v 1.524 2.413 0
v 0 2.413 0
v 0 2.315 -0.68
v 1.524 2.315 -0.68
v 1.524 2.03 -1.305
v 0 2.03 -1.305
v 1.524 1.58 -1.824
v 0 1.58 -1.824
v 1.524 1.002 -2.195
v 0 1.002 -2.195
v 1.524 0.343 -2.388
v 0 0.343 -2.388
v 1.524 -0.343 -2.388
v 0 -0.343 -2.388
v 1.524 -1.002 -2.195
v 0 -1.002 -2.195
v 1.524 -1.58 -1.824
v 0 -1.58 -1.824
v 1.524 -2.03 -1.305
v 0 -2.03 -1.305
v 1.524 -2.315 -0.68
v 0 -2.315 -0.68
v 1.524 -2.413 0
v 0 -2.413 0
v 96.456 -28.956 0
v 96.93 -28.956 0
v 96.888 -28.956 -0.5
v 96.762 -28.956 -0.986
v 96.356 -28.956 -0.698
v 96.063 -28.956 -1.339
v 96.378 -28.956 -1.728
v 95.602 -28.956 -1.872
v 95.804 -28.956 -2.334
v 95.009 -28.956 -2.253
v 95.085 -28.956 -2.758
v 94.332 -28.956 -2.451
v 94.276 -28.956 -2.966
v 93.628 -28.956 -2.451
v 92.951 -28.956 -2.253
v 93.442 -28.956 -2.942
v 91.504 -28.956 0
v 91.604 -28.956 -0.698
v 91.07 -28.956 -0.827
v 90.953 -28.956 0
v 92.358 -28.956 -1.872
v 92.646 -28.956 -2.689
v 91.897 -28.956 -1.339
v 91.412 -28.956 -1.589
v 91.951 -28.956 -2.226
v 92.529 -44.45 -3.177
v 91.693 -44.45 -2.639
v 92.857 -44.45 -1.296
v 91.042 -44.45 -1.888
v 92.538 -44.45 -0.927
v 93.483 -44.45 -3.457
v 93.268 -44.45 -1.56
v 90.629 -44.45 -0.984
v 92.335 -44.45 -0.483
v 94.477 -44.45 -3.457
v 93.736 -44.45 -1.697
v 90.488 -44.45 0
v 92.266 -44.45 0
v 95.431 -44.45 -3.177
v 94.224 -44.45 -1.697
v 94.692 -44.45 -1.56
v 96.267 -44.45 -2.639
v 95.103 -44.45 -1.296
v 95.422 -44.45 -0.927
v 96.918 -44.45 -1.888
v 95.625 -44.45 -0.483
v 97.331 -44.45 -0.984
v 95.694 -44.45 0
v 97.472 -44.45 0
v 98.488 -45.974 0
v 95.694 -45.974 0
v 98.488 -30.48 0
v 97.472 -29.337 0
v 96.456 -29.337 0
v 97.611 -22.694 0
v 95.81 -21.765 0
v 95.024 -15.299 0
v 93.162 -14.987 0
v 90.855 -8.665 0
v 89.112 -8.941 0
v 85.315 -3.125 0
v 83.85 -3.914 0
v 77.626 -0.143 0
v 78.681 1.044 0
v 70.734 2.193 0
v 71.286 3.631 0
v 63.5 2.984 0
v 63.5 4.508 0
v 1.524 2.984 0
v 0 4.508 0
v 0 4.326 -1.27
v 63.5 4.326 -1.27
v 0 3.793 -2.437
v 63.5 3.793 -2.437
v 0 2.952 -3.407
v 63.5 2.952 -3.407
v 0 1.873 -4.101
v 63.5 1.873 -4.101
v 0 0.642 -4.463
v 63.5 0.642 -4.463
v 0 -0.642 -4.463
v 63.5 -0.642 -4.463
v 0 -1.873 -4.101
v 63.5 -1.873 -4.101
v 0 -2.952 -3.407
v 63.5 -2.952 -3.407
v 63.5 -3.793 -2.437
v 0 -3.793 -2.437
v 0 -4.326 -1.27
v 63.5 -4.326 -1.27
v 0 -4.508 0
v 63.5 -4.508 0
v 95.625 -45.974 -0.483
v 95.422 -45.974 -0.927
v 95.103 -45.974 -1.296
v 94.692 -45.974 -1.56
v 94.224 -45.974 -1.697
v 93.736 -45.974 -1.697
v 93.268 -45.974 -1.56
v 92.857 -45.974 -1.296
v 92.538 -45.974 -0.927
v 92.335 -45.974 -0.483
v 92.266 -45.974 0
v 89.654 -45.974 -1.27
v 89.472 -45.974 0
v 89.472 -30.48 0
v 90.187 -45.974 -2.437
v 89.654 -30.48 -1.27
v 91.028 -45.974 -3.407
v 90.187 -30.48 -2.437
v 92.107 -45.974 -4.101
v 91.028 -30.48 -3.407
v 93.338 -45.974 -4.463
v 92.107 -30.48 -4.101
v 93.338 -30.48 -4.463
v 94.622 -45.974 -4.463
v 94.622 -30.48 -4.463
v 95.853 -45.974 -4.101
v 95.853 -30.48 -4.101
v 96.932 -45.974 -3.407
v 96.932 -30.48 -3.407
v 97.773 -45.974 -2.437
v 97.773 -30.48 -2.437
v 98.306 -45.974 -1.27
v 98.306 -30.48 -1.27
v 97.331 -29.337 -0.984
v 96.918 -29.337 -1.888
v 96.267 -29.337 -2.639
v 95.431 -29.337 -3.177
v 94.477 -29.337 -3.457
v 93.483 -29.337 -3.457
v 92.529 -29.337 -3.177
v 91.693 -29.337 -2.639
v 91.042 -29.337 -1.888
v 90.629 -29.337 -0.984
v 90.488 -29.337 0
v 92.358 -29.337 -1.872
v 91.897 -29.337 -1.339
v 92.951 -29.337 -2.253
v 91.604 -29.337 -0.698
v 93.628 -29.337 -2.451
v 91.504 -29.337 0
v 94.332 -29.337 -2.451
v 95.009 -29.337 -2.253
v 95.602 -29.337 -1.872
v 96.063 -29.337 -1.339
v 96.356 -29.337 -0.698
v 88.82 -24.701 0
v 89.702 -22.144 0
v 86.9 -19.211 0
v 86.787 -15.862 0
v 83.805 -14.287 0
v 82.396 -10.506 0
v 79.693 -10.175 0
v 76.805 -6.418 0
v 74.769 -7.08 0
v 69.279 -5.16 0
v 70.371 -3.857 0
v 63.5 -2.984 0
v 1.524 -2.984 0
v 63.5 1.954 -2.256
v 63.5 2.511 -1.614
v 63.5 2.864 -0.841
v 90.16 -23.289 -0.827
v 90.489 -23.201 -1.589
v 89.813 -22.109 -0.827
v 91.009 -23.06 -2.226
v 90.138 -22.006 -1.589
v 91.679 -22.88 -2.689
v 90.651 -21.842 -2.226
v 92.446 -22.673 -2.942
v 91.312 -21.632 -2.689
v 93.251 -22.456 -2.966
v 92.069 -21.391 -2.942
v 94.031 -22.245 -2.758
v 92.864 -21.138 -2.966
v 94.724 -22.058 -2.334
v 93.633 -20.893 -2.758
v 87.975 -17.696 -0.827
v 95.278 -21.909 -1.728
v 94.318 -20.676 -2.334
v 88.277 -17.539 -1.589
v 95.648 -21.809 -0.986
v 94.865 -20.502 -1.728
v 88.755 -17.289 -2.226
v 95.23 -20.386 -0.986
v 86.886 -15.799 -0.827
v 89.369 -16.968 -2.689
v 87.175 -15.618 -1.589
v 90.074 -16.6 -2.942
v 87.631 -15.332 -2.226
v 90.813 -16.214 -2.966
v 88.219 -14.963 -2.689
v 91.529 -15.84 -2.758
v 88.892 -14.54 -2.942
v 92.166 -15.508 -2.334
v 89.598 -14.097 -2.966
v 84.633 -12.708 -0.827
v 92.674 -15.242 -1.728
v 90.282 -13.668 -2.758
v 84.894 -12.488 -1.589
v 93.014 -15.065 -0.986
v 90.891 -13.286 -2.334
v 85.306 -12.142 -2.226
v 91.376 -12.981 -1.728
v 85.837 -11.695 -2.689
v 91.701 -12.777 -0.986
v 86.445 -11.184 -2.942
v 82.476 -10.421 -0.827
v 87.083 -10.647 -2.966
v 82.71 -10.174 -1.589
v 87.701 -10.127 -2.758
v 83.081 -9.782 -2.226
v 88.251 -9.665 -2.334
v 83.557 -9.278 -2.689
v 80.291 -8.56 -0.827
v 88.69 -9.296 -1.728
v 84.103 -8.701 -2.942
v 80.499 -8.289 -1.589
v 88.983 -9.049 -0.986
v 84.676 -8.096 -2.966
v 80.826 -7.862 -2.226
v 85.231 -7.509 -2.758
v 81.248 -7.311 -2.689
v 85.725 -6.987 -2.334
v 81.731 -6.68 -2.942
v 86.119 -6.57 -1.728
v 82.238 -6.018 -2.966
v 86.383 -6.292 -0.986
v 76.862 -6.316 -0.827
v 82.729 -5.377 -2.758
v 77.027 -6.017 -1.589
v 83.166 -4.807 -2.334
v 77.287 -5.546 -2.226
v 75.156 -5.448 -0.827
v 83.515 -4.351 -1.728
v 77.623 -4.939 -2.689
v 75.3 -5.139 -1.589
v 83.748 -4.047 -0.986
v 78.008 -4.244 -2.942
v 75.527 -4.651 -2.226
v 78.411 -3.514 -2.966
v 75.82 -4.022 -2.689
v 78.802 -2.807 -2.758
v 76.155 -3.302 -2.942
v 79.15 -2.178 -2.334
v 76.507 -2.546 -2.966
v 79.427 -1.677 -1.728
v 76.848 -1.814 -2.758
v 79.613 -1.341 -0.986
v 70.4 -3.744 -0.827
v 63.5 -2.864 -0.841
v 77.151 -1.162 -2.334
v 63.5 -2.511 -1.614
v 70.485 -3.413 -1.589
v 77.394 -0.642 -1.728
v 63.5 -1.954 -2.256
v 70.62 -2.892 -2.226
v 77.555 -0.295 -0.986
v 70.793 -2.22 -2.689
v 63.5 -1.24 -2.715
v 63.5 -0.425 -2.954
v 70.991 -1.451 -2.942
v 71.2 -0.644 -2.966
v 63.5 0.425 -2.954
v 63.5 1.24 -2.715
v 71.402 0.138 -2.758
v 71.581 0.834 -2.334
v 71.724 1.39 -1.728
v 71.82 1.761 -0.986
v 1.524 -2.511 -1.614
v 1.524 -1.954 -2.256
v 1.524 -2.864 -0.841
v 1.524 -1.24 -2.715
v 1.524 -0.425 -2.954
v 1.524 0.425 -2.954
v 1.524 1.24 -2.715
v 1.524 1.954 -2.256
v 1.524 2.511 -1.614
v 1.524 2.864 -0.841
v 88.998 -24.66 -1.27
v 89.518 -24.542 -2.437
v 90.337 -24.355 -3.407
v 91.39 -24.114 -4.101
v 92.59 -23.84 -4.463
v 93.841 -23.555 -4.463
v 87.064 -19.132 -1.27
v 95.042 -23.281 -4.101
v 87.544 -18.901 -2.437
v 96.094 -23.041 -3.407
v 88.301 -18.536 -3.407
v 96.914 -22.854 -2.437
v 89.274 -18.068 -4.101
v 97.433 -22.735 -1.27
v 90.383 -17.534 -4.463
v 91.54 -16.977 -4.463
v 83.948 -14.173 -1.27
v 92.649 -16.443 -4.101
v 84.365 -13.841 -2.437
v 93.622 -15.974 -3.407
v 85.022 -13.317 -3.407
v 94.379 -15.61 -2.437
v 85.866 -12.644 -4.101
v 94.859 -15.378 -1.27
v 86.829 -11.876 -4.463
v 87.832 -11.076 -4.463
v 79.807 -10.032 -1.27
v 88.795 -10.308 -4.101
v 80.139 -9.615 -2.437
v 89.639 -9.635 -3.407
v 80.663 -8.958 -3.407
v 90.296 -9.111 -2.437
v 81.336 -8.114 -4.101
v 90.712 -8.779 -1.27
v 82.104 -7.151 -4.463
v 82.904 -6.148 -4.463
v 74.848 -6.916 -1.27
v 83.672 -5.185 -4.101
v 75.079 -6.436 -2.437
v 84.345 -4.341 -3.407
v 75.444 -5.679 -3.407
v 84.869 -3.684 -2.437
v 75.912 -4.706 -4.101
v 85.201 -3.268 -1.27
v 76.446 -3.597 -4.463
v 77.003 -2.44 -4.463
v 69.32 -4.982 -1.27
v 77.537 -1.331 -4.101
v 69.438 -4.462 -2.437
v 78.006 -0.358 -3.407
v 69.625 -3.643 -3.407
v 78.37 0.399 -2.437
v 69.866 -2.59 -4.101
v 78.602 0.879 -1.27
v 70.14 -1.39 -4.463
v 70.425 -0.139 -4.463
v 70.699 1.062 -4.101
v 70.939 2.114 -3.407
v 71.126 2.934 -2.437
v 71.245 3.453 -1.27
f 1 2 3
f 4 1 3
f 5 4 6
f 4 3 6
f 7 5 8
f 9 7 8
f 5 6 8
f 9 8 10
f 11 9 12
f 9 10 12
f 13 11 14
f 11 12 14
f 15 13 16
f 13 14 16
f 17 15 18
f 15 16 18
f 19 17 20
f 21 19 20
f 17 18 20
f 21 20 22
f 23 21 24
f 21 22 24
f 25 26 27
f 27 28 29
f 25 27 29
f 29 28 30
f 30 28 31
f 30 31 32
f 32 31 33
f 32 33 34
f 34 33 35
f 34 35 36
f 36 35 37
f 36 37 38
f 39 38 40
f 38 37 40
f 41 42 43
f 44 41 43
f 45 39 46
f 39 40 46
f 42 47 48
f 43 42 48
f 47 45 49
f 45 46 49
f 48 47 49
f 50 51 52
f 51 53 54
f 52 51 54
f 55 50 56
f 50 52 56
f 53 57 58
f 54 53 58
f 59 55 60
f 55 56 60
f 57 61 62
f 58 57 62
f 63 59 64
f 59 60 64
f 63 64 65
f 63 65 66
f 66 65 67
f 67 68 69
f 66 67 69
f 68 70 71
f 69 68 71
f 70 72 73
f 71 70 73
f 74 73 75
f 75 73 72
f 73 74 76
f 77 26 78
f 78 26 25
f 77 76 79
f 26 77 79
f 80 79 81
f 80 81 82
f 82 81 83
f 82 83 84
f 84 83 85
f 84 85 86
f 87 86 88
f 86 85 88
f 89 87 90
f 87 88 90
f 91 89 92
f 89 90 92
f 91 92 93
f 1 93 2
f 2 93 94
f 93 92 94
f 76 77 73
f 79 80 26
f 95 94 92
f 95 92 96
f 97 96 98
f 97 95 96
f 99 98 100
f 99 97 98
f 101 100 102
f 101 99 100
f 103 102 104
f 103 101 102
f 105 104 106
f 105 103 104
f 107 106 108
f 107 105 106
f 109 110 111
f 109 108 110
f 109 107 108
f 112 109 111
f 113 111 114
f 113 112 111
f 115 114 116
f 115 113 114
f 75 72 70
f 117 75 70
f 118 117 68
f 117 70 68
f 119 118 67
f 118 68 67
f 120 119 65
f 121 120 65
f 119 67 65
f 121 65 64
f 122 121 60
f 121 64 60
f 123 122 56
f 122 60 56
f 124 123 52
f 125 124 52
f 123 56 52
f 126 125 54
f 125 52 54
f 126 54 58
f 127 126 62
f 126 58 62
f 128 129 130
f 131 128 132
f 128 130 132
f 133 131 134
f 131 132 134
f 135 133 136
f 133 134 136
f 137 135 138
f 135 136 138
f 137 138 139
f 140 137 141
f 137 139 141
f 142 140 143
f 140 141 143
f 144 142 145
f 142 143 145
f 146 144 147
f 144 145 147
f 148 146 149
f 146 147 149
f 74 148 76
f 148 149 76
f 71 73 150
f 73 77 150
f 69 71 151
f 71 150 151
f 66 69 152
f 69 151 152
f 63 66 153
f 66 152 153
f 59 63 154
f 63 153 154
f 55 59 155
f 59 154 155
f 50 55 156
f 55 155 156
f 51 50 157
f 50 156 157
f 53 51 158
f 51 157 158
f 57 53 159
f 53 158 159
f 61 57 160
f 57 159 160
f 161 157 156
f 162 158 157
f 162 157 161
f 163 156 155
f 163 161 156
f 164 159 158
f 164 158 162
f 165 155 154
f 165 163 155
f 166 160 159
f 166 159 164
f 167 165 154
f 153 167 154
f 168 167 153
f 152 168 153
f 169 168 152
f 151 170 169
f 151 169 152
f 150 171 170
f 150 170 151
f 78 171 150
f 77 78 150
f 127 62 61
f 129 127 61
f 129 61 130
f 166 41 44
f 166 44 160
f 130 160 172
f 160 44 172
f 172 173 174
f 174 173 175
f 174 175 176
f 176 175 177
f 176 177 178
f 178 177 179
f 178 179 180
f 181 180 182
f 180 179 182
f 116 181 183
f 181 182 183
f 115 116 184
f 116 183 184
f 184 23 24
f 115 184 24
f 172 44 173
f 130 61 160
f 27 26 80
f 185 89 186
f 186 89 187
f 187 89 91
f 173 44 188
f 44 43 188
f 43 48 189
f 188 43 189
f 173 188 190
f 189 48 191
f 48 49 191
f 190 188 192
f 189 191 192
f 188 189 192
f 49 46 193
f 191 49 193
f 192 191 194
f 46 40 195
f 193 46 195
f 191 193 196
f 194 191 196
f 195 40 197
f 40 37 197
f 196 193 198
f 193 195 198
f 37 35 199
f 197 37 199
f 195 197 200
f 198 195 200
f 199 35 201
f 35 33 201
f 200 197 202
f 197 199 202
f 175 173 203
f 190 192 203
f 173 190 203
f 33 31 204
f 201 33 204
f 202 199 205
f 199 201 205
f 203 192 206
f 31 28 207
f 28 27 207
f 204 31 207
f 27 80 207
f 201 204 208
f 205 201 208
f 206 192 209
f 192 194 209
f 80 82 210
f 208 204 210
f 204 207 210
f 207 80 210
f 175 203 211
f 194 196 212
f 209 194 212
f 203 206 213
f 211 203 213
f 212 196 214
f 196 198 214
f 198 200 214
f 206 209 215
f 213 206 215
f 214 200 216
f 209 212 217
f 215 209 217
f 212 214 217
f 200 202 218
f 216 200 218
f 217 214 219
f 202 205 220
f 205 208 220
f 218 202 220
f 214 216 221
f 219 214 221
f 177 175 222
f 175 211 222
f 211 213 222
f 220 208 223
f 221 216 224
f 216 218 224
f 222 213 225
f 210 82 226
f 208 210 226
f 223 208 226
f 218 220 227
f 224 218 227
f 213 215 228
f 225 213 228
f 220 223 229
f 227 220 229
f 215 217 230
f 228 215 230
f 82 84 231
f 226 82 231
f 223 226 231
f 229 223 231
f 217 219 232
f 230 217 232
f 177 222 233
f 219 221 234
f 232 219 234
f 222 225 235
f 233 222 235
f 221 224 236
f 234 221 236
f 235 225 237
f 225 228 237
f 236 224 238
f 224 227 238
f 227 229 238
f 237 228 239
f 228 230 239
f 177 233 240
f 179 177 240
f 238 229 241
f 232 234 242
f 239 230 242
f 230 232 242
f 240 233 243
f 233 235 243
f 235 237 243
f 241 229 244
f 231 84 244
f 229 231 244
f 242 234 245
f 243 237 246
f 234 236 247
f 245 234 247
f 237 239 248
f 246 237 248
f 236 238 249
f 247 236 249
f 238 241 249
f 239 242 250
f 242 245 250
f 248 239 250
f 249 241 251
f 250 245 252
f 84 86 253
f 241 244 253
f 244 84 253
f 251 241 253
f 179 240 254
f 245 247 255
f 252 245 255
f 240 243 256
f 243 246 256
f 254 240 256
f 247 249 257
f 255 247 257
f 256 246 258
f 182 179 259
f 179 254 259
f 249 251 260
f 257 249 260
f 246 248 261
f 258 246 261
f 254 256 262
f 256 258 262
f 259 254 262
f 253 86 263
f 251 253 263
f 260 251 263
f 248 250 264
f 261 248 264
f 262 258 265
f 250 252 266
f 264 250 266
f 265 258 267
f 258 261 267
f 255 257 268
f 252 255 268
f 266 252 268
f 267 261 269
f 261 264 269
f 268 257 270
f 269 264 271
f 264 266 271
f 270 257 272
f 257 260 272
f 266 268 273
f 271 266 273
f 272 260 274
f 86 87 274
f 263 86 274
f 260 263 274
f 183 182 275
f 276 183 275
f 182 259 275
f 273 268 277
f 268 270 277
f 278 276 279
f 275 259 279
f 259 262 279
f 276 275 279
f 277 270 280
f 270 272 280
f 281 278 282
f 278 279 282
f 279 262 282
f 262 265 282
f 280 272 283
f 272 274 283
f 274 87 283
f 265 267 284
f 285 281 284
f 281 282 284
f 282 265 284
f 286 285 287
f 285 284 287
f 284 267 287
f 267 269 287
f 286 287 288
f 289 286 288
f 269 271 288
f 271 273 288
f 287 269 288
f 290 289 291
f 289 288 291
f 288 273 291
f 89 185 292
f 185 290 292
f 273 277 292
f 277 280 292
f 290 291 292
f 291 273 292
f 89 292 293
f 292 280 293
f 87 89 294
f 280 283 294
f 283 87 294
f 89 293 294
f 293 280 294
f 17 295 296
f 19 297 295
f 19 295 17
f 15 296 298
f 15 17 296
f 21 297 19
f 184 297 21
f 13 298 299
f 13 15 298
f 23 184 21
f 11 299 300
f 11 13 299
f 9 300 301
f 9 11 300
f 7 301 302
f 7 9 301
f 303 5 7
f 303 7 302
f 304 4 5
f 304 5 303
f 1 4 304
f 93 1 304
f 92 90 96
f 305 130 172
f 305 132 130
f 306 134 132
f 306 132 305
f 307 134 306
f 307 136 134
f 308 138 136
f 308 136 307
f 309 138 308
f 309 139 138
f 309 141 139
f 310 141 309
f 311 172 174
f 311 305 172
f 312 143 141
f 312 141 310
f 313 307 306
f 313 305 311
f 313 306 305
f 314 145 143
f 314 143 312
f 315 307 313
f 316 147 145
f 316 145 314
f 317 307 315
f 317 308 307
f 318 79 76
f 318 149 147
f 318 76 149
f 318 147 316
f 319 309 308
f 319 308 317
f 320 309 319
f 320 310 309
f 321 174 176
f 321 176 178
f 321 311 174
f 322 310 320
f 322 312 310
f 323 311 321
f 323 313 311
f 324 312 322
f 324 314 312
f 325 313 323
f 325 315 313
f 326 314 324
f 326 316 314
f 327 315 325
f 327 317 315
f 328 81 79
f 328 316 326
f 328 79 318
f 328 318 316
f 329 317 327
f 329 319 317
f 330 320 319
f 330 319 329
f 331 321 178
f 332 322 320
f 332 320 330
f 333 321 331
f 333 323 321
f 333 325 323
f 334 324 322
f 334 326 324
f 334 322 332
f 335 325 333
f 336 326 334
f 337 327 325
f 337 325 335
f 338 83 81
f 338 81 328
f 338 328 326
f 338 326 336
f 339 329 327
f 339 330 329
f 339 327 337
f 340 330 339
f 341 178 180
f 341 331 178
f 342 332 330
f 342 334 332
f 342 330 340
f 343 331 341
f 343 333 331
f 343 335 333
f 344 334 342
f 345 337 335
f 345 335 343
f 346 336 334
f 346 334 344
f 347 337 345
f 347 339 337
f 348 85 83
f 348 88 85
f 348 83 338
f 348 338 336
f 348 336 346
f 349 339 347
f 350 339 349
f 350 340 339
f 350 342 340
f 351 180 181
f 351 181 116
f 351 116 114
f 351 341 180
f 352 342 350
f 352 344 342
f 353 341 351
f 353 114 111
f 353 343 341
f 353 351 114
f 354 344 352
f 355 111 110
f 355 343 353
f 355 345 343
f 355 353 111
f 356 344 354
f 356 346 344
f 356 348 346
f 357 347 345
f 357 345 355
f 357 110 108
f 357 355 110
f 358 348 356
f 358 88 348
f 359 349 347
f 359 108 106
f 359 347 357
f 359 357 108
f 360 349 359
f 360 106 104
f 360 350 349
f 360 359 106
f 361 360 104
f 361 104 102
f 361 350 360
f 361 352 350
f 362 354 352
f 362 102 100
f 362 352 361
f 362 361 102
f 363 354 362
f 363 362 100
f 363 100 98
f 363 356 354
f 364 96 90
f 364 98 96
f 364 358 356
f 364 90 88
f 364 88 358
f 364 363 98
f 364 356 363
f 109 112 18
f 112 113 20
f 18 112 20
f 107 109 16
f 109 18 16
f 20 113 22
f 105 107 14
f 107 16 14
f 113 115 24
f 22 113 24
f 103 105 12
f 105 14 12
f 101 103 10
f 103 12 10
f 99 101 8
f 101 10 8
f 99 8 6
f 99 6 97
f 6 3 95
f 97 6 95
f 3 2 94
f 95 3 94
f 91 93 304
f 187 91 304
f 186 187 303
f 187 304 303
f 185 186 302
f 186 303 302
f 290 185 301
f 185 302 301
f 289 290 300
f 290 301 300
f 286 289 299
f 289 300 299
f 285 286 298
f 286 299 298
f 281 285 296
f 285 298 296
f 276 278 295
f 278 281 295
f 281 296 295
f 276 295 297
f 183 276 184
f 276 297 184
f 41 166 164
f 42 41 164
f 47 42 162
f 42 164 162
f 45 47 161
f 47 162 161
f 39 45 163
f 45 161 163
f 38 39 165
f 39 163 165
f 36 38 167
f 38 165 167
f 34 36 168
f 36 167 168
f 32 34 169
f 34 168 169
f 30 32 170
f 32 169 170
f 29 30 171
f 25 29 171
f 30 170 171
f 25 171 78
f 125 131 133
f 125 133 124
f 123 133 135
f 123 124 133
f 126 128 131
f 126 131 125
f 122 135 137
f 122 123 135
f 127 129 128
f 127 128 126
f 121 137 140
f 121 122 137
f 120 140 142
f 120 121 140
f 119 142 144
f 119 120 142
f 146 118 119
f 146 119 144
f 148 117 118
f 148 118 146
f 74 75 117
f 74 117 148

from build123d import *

# Parameters (mm, degrees)
F4_T      = -1.524
F6_DEPTH  = 1.524
F7_DEPTH  = 1.143
F9_DEPTH  = 1.524
F10_DEPTH = 13.97
F12_DEPTH = 1.524


with BuildPart() as f3:
    # F3: sweep along a path in F0
    with BuildLine(Plane.XY) as f3_path:
        ThreePointArc((93.98, -30.48), (85.0526146906, -8.9273853094), (63.5, 0))
        Line((63.5, 0), (0, 0))
    # F2 (on plane+point) → F3 (sweep)
    with BuildSketch(Plane.XZ.offset(30.48)):
        with BuildLine():
            Line((98.4885, 0), (89.4715, 0))
            ThreePointArc((89.4715, 0), (93.98, -4.5085), (98.4885, 0))
        make_face()
    sweep(path=f3_path.line)

    # F4
    f4_openings = [f3.faces().sort_by_distance(p)[0] for p in [
        (87.501546, -6.478454, 0),
    ]]
    offset(amount=F4_T, openings=f4_openings)

    # F5 (on face) → F6 (cut, through all)
    with BuildSketch(Plane.XZ.offset(30.48)):
        with BuildLine():
            ThreePointArc((91.5035, 0), (93.98, -2.4765), (96.4565, 0))
            Line((96.4565, 0), (91.5035, 0))
        make_face()
    extrude(amount=-F6_DEPTH, mode=Mode.SUBTRACT)

    # F5 (on face) → F7 (cut)
    with BuildSketch(Plane.XZ.offset(30.48)):
        with BuildLine():
            Line((97.4725, 0), (96.4565, 0))
            ThreePointArc((96.4565, 0), (93.98, -2.4765), (91.5035, 0))
            Line((91.5035, 0), (90.4875, 0))
            ThreePointArc((90.4875, 0), (93.98, -3.4925), (97.4725, 0))
        make_face()
    extrude(amount=-F7_DEPTH, mode=Mode.SUBTRACT)

    # F8 (on face) → F9 (cut, through all)
    with BuildSketch(Plane(origin=(0, 0, 0), x_dir=(0, -1, 0), z_dir=(-1, 0, 0))):
        with BuildLine():
            ThreePointArc((-2.413, 0), (0, -2.413), (2.413, 0))
            Line((2.413, 0), (-2.413, 0))
        make_face()
    extrude(amount=-F9_DEPTH, mode=Mode.SUBTRACT)

    # F5 (on face) → F10 (join)
    with BuildSketch(Plane.XZ.offset(30.48)):
        with BuildLine():
            Line((98.4885, 0), (97.4725, 0))
            ThreePointArc((97.4725, 0), (93.98, -3.4925), (90.4875, 0))
            Line((90.4875, 0), (89.4715, 0))
            ThreePointArc((89.4715, 0), (93.98, -4.5085), (98.4885, 0))
        make_face()
    extrude(amount=F10_DEPTH)

    # F11 (on face) → F12 (join)
    with BuildSketch(Plane.XZ.offset(44.45)):
        with BuildLine():
            Line((98.4885, 0), (97.4725, 0))
            ThreePointArc((97.4725, 0), (93.98, -3.4925), (90.4875, 0))
            Line((90.4875, 0), (89.4715, 0))
            ThreePointArc((89.4715, 0), (93.98, -4.5085), (98.4885, 0))
        make_face()
        with BuildLine():
            ThreePointArc((90.4875, 0), (93.98, -3.4925), (97.4725, 0))
            Line((97.4725, 0), (95.6945, 0))
            ThreePointArc((95.6945, 0), (93.98, -1.7145), (92.2655, 0))
            Line((92.2655, 0), (90.4875, 0))
        make_face()
    extrude(amount=F12_DEPTH)


solid = f3.part
